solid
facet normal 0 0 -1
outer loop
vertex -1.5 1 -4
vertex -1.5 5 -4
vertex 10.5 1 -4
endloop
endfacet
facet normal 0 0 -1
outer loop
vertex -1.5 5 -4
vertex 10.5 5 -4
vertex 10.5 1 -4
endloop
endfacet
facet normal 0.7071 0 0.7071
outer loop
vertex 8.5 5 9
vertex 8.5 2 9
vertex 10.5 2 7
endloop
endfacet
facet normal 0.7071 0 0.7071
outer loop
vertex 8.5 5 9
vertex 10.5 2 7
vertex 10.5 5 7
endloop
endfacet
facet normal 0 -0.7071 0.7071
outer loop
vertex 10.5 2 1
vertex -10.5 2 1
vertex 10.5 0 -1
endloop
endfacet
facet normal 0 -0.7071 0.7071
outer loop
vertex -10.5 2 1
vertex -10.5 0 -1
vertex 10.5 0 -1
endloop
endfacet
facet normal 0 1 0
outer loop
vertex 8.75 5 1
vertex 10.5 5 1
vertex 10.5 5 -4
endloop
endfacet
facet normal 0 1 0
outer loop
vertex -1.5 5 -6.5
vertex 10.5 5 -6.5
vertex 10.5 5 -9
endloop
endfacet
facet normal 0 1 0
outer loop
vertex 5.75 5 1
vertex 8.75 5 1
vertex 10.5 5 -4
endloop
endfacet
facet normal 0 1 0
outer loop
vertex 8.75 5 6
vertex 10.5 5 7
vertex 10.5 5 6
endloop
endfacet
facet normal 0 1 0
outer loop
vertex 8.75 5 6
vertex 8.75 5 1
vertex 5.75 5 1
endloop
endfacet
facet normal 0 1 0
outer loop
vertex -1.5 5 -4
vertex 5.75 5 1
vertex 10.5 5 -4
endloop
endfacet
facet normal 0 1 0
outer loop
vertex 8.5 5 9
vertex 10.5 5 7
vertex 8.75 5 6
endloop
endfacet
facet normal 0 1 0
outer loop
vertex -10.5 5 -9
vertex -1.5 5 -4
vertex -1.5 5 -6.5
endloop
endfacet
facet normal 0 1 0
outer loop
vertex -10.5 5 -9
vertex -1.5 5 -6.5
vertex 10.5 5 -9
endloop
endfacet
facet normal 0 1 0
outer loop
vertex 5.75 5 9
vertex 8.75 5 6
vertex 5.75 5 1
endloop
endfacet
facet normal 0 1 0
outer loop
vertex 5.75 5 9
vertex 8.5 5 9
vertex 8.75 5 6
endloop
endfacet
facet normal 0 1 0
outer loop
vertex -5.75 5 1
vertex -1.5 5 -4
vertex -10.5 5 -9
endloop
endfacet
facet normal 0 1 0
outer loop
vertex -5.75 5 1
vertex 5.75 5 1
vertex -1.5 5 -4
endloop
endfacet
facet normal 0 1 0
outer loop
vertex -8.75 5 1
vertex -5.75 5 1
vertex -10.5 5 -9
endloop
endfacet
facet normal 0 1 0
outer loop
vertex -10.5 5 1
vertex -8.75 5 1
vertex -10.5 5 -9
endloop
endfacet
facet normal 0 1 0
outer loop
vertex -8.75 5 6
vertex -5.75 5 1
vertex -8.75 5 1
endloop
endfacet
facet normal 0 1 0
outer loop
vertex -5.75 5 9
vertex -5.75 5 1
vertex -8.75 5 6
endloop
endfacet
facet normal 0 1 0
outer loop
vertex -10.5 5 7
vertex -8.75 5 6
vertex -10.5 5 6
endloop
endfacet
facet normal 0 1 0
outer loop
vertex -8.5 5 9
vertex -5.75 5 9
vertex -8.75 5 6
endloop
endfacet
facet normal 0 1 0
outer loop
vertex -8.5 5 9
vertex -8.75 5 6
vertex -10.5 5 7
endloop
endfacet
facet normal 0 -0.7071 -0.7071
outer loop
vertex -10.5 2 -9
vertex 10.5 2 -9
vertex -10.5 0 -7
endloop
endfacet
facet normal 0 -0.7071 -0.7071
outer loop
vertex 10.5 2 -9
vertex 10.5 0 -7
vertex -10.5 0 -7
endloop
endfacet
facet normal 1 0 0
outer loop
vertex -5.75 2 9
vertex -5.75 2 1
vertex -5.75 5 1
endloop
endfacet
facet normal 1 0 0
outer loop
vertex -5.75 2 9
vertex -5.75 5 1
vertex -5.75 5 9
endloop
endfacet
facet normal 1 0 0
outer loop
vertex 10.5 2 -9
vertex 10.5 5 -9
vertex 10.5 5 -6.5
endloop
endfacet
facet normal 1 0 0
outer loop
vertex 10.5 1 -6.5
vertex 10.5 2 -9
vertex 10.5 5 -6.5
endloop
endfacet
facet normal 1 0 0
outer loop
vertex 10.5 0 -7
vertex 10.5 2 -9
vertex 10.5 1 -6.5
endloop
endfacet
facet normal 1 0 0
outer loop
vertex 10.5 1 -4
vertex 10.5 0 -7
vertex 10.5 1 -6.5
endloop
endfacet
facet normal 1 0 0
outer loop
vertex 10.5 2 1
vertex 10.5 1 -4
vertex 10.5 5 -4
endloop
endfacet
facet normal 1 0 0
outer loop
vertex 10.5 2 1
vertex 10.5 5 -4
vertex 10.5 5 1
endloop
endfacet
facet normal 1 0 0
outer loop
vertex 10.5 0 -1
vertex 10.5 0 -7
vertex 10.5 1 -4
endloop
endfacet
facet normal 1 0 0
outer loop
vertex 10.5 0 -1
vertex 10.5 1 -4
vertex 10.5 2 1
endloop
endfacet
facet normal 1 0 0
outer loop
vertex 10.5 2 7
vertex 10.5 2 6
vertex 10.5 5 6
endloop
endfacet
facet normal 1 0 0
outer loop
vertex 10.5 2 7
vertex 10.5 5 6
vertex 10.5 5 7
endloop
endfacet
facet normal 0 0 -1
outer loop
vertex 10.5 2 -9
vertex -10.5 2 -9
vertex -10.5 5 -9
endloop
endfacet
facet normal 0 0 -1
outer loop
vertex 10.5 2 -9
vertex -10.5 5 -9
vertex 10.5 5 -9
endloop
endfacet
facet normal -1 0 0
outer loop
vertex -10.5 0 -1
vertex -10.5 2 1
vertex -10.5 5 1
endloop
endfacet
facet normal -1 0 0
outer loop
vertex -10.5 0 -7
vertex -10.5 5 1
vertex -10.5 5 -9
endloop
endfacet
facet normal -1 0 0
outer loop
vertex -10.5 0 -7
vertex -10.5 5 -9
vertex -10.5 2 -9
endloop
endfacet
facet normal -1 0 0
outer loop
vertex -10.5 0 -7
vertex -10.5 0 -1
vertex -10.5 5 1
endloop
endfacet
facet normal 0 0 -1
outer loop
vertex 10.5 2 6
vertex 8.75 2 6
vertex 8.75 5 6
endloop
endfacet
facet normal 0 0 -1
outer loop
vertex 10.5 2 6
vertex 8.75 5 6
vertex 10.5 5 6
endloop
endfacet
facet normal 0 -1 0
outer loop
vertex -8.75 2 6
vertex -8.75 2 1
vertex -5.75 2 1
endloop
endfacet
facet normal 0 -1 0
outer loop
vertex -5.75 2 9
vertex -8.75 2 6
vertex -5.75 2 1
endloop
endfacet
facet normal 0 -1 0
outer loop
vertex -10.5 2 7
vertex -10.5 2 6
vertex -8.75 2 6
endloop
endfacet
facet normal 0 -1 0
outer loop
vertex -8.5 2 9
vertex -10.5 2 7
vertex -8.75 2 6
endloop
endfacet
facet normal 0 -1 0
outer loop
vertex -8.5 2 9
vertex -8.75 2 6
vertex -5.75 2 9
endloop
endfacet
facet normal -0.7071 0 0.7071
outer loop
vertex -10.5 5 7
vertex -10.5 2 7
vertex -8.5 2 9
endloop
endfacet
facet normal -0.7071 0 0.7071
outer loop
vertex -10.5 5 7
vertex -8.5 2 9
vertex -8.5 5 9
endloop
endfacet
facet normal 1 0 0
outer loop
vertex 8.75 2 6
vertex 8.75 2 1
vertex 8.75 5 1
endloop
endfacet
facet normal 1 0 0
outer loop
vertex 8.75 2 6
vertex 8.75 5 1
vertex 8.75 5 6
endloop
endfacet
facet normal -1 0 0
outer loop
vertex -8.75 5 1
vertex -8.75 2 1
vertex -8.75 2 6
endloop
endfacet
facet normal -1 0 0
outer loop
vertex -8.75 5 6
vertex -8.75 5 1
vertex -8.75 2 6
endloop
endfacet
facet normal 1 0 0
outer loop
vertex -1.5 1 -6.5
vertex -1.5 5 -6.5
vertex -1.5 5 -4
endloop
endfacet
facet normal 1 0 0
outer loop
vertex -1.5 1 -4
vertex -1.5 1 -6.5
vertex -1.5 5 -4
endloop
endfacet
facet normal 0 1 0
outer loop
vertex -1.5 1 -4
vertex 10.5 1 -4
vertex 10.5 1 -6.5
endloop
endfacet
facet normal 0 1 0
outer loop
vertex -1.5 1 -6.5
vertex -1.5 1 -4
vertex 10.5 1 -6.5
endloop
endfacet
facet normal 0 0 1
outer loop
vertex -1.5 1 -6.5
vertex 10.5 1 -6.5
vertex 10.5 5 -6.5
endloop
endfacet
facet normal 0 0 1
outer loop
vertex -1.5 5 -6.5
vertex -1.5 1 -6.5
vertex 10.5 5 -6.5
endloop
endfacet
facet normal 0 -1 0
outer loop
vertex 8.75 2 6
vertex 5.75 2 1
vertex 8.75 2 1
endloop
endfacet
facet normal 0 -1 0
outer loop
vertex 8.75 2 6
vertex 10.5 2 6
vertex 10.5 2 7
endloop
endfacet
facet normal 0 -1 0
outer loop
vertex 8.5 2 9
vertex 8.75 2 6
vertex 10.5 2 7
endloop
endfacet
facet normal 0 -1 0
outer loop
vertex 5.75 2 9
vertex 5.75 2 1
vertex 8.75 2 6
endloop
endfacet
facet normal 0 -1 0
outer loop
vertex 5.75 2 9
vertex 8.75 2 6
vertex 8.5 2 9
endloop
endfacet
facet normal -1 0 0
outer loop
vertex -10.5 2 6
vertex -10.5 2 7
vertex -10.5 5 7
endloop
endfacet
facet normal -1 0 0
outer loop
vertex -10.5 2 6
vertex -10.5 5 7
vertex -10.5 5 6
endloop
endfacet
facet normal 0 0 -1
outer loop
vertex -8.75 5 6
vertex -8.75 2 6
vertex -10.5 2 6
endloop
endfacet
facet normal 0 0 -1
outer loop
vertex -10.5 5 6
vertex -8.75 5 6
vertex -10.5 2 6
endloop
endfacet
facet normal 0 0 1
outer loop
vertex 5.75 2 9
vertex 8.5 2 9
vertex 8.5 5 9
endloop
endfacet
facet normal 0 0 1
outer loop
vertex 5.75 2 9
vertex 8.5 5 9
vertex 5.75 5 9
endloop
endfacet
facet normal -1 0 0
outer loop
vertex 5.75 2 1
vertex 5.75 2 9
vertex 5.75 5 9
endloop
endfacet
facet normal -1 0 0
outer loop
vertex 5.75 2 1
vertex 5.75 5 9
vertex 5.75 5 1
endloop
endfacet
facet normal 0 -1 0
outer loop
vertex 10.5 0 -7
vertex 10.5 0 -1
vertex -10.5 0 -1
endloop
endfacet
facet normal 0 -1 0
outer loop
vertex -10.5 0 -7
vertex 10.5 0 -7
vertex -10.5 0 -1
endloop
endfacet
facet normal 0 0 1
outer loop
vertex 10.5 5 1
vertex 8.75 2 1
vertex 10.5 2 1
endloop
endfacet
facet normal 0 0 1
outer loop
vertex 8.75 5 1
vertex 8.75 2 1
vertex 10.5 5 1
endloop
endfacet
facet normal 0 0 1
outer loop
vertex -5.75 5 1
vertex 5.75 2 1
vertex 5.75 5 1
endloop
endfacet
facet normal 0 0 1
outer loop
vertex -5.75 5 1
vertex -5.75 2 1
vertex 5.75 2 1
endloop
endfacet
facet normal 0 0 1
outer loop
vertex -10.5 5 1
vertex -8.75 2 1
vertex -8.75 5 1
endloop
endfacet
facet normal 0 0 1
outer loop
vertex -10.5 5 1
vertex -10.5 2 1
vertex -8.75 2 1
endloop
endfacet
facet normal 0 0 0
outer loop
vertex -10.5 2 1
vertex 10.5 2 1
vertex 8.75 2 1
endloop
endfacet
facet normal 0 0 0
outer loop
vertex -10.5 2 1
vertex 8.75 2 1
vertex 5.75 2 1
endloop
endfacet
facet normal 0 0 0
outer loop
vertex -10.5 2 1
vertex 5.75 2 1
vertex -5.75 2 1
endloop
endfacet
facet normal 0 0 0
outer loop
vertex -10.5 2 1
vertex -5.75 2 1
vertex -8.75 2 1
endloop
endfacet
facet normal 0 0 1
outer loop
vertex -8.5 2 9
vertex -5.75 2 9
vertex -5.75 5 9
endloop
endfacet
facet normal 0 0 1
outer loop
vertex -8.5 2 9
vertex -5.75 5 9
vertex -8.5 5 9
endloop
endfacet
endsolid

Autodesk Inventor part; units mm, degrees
ref_plane "YZ Plane" through (0, 0, 0) normal (1, 0, 0) x (0, 1, 0)
ref_plane "XZ Plane" through (0, 0, 0) normal (0, 1, 0) x (-1, 0, 0)
ref_plane "XY Plane" through (0, 0, 0) normal (0, 0, 1) x (1, 0, 0)
sketch "Sketch1" plane through (0, 0, 0) normal (0, 1, 0) x (-1, 0, 0)
  line L0 (10.5, -9) -> (-10.5, -9)
  line L1 (-10.5, -9) -> (-10.5, 9)
  line L2 (-10.5, 9) -> (10.5, 9)
  line L3 (10.5, 9) -> (10.5, -9)
  point P0 (0, 0)
  point P1 (0, -9)
  point P2 (10.5, 0)
  dimension "d0" = 21
  dimension "d1" = 18
extrude "Extrusion1" add sketch "Sketch1" along normal blind 5
sketch "Sketch2" plane through (-10.5, 0, -9) normal (-1, 0, 0) x (0, 0, 1)
  line L0 (18, 0) -> (10, 0)
  line L1 (10, 0) -> (10, 2)
  line L2 (10, 2) -> (18, 2)
  line L3 (18, 2) -> (18, 0)
  point P0 (9, 0)
  dimension "d4" = 2
  dimension "d5" = 8
extrude "Extrusion2" cut sketch "Sketch2" against normal through all
sketch "Sketch3" plane through (-10.5, 2, 1) normal (0, -1, 0) x (1, 0, 0)
  line L0 (21, 8) -> (21, -10) projected
  line L1 (21, 0) -> (19.25, 0)
  line L2 (19.25, 0) -> (19.25, 5)
  line L3 (19.25, 5) -> (21, 5)
  line L4 (21, 5) -> (21, 0)
  line L5 (0, -10) -> (0, 8) projected
  line L6 (0, 0) -> (1.75, 0)
  line L7 (1.75, 0) -> (1.75, 5)
  line L8 (1.75, 5) -> (0, 5)
  line L9 (0, 5) -> (0, 0)
  line L10 (0, 8) -> (21, 8) projected
  point P0 (10.5, -1)
  point P1 (0, 5)
  dimension "d8" = 5
  dimension "d9" = 3
  dimension "d10" = 17.5
extrude "Extrusion3" cut sketch "Sketch3" against normal through all
sketch "Sketch4" plane through (-10.5, 2, 9) normal (0, -1, 0) x (1, 0, 0)
  line L0 (16.25, -8) -> (4.75, -8)
  line L1 (4.75, -8) -> (4.75, 0)
  line L2 (4.75, 0) -> (16.25, 0)
  line L3 (16.25, 0) -> (16.25, -8)
  line L4 (19.25, -8) -> (19.25, -3) projected
  line L5 (1.75, -3) -> (1.75, -8) projected
  point P0 (10.5, -9)
  point P1 (21, 0)
  point P2 (0, -8)
  dimension "d13" = 3
  dimension "d14" = 3
extrude "Extrusion4" cut sketch "Sketch4" against normal through all
chamfer "Chamfer1" distance 2 angle 45 2 edges at (10.5, 3.5, 9) (-10.5, 3.5, 9)
sketch "Sketch6" plane through (10.5, 0, -9) normal (-1, 0, 0) x (0, 0, 1)
  line L0 (10, 5) -> (0, 5) projected
  line L1 (2.5, 5) -> (5, 5)
  line L2 (5, 5) -> (5, 1)
  line L3 (5, 1) -> (2.5, 1)
  line L4 (2.5, 1) -> (2.5, 5)
  line L5 (0, 0) -> (10, 0) projected
  line L6 (10, 0) -> (10, 5) projected
  point P0 (9, 0)
  dimension "d20" = 2.5
  dimension "d22" = 1
  dimension "d23" = 5
chamfer "Chamfer2" distance 2 angle 45 2 edges at (0, 0, 1) (0, 0, -9)
extrude "Extrusion7" cut sketch "Sketch6" along normal blind 12
equation "\"d14\" = d13"
properties part number "Breakout Clip"
